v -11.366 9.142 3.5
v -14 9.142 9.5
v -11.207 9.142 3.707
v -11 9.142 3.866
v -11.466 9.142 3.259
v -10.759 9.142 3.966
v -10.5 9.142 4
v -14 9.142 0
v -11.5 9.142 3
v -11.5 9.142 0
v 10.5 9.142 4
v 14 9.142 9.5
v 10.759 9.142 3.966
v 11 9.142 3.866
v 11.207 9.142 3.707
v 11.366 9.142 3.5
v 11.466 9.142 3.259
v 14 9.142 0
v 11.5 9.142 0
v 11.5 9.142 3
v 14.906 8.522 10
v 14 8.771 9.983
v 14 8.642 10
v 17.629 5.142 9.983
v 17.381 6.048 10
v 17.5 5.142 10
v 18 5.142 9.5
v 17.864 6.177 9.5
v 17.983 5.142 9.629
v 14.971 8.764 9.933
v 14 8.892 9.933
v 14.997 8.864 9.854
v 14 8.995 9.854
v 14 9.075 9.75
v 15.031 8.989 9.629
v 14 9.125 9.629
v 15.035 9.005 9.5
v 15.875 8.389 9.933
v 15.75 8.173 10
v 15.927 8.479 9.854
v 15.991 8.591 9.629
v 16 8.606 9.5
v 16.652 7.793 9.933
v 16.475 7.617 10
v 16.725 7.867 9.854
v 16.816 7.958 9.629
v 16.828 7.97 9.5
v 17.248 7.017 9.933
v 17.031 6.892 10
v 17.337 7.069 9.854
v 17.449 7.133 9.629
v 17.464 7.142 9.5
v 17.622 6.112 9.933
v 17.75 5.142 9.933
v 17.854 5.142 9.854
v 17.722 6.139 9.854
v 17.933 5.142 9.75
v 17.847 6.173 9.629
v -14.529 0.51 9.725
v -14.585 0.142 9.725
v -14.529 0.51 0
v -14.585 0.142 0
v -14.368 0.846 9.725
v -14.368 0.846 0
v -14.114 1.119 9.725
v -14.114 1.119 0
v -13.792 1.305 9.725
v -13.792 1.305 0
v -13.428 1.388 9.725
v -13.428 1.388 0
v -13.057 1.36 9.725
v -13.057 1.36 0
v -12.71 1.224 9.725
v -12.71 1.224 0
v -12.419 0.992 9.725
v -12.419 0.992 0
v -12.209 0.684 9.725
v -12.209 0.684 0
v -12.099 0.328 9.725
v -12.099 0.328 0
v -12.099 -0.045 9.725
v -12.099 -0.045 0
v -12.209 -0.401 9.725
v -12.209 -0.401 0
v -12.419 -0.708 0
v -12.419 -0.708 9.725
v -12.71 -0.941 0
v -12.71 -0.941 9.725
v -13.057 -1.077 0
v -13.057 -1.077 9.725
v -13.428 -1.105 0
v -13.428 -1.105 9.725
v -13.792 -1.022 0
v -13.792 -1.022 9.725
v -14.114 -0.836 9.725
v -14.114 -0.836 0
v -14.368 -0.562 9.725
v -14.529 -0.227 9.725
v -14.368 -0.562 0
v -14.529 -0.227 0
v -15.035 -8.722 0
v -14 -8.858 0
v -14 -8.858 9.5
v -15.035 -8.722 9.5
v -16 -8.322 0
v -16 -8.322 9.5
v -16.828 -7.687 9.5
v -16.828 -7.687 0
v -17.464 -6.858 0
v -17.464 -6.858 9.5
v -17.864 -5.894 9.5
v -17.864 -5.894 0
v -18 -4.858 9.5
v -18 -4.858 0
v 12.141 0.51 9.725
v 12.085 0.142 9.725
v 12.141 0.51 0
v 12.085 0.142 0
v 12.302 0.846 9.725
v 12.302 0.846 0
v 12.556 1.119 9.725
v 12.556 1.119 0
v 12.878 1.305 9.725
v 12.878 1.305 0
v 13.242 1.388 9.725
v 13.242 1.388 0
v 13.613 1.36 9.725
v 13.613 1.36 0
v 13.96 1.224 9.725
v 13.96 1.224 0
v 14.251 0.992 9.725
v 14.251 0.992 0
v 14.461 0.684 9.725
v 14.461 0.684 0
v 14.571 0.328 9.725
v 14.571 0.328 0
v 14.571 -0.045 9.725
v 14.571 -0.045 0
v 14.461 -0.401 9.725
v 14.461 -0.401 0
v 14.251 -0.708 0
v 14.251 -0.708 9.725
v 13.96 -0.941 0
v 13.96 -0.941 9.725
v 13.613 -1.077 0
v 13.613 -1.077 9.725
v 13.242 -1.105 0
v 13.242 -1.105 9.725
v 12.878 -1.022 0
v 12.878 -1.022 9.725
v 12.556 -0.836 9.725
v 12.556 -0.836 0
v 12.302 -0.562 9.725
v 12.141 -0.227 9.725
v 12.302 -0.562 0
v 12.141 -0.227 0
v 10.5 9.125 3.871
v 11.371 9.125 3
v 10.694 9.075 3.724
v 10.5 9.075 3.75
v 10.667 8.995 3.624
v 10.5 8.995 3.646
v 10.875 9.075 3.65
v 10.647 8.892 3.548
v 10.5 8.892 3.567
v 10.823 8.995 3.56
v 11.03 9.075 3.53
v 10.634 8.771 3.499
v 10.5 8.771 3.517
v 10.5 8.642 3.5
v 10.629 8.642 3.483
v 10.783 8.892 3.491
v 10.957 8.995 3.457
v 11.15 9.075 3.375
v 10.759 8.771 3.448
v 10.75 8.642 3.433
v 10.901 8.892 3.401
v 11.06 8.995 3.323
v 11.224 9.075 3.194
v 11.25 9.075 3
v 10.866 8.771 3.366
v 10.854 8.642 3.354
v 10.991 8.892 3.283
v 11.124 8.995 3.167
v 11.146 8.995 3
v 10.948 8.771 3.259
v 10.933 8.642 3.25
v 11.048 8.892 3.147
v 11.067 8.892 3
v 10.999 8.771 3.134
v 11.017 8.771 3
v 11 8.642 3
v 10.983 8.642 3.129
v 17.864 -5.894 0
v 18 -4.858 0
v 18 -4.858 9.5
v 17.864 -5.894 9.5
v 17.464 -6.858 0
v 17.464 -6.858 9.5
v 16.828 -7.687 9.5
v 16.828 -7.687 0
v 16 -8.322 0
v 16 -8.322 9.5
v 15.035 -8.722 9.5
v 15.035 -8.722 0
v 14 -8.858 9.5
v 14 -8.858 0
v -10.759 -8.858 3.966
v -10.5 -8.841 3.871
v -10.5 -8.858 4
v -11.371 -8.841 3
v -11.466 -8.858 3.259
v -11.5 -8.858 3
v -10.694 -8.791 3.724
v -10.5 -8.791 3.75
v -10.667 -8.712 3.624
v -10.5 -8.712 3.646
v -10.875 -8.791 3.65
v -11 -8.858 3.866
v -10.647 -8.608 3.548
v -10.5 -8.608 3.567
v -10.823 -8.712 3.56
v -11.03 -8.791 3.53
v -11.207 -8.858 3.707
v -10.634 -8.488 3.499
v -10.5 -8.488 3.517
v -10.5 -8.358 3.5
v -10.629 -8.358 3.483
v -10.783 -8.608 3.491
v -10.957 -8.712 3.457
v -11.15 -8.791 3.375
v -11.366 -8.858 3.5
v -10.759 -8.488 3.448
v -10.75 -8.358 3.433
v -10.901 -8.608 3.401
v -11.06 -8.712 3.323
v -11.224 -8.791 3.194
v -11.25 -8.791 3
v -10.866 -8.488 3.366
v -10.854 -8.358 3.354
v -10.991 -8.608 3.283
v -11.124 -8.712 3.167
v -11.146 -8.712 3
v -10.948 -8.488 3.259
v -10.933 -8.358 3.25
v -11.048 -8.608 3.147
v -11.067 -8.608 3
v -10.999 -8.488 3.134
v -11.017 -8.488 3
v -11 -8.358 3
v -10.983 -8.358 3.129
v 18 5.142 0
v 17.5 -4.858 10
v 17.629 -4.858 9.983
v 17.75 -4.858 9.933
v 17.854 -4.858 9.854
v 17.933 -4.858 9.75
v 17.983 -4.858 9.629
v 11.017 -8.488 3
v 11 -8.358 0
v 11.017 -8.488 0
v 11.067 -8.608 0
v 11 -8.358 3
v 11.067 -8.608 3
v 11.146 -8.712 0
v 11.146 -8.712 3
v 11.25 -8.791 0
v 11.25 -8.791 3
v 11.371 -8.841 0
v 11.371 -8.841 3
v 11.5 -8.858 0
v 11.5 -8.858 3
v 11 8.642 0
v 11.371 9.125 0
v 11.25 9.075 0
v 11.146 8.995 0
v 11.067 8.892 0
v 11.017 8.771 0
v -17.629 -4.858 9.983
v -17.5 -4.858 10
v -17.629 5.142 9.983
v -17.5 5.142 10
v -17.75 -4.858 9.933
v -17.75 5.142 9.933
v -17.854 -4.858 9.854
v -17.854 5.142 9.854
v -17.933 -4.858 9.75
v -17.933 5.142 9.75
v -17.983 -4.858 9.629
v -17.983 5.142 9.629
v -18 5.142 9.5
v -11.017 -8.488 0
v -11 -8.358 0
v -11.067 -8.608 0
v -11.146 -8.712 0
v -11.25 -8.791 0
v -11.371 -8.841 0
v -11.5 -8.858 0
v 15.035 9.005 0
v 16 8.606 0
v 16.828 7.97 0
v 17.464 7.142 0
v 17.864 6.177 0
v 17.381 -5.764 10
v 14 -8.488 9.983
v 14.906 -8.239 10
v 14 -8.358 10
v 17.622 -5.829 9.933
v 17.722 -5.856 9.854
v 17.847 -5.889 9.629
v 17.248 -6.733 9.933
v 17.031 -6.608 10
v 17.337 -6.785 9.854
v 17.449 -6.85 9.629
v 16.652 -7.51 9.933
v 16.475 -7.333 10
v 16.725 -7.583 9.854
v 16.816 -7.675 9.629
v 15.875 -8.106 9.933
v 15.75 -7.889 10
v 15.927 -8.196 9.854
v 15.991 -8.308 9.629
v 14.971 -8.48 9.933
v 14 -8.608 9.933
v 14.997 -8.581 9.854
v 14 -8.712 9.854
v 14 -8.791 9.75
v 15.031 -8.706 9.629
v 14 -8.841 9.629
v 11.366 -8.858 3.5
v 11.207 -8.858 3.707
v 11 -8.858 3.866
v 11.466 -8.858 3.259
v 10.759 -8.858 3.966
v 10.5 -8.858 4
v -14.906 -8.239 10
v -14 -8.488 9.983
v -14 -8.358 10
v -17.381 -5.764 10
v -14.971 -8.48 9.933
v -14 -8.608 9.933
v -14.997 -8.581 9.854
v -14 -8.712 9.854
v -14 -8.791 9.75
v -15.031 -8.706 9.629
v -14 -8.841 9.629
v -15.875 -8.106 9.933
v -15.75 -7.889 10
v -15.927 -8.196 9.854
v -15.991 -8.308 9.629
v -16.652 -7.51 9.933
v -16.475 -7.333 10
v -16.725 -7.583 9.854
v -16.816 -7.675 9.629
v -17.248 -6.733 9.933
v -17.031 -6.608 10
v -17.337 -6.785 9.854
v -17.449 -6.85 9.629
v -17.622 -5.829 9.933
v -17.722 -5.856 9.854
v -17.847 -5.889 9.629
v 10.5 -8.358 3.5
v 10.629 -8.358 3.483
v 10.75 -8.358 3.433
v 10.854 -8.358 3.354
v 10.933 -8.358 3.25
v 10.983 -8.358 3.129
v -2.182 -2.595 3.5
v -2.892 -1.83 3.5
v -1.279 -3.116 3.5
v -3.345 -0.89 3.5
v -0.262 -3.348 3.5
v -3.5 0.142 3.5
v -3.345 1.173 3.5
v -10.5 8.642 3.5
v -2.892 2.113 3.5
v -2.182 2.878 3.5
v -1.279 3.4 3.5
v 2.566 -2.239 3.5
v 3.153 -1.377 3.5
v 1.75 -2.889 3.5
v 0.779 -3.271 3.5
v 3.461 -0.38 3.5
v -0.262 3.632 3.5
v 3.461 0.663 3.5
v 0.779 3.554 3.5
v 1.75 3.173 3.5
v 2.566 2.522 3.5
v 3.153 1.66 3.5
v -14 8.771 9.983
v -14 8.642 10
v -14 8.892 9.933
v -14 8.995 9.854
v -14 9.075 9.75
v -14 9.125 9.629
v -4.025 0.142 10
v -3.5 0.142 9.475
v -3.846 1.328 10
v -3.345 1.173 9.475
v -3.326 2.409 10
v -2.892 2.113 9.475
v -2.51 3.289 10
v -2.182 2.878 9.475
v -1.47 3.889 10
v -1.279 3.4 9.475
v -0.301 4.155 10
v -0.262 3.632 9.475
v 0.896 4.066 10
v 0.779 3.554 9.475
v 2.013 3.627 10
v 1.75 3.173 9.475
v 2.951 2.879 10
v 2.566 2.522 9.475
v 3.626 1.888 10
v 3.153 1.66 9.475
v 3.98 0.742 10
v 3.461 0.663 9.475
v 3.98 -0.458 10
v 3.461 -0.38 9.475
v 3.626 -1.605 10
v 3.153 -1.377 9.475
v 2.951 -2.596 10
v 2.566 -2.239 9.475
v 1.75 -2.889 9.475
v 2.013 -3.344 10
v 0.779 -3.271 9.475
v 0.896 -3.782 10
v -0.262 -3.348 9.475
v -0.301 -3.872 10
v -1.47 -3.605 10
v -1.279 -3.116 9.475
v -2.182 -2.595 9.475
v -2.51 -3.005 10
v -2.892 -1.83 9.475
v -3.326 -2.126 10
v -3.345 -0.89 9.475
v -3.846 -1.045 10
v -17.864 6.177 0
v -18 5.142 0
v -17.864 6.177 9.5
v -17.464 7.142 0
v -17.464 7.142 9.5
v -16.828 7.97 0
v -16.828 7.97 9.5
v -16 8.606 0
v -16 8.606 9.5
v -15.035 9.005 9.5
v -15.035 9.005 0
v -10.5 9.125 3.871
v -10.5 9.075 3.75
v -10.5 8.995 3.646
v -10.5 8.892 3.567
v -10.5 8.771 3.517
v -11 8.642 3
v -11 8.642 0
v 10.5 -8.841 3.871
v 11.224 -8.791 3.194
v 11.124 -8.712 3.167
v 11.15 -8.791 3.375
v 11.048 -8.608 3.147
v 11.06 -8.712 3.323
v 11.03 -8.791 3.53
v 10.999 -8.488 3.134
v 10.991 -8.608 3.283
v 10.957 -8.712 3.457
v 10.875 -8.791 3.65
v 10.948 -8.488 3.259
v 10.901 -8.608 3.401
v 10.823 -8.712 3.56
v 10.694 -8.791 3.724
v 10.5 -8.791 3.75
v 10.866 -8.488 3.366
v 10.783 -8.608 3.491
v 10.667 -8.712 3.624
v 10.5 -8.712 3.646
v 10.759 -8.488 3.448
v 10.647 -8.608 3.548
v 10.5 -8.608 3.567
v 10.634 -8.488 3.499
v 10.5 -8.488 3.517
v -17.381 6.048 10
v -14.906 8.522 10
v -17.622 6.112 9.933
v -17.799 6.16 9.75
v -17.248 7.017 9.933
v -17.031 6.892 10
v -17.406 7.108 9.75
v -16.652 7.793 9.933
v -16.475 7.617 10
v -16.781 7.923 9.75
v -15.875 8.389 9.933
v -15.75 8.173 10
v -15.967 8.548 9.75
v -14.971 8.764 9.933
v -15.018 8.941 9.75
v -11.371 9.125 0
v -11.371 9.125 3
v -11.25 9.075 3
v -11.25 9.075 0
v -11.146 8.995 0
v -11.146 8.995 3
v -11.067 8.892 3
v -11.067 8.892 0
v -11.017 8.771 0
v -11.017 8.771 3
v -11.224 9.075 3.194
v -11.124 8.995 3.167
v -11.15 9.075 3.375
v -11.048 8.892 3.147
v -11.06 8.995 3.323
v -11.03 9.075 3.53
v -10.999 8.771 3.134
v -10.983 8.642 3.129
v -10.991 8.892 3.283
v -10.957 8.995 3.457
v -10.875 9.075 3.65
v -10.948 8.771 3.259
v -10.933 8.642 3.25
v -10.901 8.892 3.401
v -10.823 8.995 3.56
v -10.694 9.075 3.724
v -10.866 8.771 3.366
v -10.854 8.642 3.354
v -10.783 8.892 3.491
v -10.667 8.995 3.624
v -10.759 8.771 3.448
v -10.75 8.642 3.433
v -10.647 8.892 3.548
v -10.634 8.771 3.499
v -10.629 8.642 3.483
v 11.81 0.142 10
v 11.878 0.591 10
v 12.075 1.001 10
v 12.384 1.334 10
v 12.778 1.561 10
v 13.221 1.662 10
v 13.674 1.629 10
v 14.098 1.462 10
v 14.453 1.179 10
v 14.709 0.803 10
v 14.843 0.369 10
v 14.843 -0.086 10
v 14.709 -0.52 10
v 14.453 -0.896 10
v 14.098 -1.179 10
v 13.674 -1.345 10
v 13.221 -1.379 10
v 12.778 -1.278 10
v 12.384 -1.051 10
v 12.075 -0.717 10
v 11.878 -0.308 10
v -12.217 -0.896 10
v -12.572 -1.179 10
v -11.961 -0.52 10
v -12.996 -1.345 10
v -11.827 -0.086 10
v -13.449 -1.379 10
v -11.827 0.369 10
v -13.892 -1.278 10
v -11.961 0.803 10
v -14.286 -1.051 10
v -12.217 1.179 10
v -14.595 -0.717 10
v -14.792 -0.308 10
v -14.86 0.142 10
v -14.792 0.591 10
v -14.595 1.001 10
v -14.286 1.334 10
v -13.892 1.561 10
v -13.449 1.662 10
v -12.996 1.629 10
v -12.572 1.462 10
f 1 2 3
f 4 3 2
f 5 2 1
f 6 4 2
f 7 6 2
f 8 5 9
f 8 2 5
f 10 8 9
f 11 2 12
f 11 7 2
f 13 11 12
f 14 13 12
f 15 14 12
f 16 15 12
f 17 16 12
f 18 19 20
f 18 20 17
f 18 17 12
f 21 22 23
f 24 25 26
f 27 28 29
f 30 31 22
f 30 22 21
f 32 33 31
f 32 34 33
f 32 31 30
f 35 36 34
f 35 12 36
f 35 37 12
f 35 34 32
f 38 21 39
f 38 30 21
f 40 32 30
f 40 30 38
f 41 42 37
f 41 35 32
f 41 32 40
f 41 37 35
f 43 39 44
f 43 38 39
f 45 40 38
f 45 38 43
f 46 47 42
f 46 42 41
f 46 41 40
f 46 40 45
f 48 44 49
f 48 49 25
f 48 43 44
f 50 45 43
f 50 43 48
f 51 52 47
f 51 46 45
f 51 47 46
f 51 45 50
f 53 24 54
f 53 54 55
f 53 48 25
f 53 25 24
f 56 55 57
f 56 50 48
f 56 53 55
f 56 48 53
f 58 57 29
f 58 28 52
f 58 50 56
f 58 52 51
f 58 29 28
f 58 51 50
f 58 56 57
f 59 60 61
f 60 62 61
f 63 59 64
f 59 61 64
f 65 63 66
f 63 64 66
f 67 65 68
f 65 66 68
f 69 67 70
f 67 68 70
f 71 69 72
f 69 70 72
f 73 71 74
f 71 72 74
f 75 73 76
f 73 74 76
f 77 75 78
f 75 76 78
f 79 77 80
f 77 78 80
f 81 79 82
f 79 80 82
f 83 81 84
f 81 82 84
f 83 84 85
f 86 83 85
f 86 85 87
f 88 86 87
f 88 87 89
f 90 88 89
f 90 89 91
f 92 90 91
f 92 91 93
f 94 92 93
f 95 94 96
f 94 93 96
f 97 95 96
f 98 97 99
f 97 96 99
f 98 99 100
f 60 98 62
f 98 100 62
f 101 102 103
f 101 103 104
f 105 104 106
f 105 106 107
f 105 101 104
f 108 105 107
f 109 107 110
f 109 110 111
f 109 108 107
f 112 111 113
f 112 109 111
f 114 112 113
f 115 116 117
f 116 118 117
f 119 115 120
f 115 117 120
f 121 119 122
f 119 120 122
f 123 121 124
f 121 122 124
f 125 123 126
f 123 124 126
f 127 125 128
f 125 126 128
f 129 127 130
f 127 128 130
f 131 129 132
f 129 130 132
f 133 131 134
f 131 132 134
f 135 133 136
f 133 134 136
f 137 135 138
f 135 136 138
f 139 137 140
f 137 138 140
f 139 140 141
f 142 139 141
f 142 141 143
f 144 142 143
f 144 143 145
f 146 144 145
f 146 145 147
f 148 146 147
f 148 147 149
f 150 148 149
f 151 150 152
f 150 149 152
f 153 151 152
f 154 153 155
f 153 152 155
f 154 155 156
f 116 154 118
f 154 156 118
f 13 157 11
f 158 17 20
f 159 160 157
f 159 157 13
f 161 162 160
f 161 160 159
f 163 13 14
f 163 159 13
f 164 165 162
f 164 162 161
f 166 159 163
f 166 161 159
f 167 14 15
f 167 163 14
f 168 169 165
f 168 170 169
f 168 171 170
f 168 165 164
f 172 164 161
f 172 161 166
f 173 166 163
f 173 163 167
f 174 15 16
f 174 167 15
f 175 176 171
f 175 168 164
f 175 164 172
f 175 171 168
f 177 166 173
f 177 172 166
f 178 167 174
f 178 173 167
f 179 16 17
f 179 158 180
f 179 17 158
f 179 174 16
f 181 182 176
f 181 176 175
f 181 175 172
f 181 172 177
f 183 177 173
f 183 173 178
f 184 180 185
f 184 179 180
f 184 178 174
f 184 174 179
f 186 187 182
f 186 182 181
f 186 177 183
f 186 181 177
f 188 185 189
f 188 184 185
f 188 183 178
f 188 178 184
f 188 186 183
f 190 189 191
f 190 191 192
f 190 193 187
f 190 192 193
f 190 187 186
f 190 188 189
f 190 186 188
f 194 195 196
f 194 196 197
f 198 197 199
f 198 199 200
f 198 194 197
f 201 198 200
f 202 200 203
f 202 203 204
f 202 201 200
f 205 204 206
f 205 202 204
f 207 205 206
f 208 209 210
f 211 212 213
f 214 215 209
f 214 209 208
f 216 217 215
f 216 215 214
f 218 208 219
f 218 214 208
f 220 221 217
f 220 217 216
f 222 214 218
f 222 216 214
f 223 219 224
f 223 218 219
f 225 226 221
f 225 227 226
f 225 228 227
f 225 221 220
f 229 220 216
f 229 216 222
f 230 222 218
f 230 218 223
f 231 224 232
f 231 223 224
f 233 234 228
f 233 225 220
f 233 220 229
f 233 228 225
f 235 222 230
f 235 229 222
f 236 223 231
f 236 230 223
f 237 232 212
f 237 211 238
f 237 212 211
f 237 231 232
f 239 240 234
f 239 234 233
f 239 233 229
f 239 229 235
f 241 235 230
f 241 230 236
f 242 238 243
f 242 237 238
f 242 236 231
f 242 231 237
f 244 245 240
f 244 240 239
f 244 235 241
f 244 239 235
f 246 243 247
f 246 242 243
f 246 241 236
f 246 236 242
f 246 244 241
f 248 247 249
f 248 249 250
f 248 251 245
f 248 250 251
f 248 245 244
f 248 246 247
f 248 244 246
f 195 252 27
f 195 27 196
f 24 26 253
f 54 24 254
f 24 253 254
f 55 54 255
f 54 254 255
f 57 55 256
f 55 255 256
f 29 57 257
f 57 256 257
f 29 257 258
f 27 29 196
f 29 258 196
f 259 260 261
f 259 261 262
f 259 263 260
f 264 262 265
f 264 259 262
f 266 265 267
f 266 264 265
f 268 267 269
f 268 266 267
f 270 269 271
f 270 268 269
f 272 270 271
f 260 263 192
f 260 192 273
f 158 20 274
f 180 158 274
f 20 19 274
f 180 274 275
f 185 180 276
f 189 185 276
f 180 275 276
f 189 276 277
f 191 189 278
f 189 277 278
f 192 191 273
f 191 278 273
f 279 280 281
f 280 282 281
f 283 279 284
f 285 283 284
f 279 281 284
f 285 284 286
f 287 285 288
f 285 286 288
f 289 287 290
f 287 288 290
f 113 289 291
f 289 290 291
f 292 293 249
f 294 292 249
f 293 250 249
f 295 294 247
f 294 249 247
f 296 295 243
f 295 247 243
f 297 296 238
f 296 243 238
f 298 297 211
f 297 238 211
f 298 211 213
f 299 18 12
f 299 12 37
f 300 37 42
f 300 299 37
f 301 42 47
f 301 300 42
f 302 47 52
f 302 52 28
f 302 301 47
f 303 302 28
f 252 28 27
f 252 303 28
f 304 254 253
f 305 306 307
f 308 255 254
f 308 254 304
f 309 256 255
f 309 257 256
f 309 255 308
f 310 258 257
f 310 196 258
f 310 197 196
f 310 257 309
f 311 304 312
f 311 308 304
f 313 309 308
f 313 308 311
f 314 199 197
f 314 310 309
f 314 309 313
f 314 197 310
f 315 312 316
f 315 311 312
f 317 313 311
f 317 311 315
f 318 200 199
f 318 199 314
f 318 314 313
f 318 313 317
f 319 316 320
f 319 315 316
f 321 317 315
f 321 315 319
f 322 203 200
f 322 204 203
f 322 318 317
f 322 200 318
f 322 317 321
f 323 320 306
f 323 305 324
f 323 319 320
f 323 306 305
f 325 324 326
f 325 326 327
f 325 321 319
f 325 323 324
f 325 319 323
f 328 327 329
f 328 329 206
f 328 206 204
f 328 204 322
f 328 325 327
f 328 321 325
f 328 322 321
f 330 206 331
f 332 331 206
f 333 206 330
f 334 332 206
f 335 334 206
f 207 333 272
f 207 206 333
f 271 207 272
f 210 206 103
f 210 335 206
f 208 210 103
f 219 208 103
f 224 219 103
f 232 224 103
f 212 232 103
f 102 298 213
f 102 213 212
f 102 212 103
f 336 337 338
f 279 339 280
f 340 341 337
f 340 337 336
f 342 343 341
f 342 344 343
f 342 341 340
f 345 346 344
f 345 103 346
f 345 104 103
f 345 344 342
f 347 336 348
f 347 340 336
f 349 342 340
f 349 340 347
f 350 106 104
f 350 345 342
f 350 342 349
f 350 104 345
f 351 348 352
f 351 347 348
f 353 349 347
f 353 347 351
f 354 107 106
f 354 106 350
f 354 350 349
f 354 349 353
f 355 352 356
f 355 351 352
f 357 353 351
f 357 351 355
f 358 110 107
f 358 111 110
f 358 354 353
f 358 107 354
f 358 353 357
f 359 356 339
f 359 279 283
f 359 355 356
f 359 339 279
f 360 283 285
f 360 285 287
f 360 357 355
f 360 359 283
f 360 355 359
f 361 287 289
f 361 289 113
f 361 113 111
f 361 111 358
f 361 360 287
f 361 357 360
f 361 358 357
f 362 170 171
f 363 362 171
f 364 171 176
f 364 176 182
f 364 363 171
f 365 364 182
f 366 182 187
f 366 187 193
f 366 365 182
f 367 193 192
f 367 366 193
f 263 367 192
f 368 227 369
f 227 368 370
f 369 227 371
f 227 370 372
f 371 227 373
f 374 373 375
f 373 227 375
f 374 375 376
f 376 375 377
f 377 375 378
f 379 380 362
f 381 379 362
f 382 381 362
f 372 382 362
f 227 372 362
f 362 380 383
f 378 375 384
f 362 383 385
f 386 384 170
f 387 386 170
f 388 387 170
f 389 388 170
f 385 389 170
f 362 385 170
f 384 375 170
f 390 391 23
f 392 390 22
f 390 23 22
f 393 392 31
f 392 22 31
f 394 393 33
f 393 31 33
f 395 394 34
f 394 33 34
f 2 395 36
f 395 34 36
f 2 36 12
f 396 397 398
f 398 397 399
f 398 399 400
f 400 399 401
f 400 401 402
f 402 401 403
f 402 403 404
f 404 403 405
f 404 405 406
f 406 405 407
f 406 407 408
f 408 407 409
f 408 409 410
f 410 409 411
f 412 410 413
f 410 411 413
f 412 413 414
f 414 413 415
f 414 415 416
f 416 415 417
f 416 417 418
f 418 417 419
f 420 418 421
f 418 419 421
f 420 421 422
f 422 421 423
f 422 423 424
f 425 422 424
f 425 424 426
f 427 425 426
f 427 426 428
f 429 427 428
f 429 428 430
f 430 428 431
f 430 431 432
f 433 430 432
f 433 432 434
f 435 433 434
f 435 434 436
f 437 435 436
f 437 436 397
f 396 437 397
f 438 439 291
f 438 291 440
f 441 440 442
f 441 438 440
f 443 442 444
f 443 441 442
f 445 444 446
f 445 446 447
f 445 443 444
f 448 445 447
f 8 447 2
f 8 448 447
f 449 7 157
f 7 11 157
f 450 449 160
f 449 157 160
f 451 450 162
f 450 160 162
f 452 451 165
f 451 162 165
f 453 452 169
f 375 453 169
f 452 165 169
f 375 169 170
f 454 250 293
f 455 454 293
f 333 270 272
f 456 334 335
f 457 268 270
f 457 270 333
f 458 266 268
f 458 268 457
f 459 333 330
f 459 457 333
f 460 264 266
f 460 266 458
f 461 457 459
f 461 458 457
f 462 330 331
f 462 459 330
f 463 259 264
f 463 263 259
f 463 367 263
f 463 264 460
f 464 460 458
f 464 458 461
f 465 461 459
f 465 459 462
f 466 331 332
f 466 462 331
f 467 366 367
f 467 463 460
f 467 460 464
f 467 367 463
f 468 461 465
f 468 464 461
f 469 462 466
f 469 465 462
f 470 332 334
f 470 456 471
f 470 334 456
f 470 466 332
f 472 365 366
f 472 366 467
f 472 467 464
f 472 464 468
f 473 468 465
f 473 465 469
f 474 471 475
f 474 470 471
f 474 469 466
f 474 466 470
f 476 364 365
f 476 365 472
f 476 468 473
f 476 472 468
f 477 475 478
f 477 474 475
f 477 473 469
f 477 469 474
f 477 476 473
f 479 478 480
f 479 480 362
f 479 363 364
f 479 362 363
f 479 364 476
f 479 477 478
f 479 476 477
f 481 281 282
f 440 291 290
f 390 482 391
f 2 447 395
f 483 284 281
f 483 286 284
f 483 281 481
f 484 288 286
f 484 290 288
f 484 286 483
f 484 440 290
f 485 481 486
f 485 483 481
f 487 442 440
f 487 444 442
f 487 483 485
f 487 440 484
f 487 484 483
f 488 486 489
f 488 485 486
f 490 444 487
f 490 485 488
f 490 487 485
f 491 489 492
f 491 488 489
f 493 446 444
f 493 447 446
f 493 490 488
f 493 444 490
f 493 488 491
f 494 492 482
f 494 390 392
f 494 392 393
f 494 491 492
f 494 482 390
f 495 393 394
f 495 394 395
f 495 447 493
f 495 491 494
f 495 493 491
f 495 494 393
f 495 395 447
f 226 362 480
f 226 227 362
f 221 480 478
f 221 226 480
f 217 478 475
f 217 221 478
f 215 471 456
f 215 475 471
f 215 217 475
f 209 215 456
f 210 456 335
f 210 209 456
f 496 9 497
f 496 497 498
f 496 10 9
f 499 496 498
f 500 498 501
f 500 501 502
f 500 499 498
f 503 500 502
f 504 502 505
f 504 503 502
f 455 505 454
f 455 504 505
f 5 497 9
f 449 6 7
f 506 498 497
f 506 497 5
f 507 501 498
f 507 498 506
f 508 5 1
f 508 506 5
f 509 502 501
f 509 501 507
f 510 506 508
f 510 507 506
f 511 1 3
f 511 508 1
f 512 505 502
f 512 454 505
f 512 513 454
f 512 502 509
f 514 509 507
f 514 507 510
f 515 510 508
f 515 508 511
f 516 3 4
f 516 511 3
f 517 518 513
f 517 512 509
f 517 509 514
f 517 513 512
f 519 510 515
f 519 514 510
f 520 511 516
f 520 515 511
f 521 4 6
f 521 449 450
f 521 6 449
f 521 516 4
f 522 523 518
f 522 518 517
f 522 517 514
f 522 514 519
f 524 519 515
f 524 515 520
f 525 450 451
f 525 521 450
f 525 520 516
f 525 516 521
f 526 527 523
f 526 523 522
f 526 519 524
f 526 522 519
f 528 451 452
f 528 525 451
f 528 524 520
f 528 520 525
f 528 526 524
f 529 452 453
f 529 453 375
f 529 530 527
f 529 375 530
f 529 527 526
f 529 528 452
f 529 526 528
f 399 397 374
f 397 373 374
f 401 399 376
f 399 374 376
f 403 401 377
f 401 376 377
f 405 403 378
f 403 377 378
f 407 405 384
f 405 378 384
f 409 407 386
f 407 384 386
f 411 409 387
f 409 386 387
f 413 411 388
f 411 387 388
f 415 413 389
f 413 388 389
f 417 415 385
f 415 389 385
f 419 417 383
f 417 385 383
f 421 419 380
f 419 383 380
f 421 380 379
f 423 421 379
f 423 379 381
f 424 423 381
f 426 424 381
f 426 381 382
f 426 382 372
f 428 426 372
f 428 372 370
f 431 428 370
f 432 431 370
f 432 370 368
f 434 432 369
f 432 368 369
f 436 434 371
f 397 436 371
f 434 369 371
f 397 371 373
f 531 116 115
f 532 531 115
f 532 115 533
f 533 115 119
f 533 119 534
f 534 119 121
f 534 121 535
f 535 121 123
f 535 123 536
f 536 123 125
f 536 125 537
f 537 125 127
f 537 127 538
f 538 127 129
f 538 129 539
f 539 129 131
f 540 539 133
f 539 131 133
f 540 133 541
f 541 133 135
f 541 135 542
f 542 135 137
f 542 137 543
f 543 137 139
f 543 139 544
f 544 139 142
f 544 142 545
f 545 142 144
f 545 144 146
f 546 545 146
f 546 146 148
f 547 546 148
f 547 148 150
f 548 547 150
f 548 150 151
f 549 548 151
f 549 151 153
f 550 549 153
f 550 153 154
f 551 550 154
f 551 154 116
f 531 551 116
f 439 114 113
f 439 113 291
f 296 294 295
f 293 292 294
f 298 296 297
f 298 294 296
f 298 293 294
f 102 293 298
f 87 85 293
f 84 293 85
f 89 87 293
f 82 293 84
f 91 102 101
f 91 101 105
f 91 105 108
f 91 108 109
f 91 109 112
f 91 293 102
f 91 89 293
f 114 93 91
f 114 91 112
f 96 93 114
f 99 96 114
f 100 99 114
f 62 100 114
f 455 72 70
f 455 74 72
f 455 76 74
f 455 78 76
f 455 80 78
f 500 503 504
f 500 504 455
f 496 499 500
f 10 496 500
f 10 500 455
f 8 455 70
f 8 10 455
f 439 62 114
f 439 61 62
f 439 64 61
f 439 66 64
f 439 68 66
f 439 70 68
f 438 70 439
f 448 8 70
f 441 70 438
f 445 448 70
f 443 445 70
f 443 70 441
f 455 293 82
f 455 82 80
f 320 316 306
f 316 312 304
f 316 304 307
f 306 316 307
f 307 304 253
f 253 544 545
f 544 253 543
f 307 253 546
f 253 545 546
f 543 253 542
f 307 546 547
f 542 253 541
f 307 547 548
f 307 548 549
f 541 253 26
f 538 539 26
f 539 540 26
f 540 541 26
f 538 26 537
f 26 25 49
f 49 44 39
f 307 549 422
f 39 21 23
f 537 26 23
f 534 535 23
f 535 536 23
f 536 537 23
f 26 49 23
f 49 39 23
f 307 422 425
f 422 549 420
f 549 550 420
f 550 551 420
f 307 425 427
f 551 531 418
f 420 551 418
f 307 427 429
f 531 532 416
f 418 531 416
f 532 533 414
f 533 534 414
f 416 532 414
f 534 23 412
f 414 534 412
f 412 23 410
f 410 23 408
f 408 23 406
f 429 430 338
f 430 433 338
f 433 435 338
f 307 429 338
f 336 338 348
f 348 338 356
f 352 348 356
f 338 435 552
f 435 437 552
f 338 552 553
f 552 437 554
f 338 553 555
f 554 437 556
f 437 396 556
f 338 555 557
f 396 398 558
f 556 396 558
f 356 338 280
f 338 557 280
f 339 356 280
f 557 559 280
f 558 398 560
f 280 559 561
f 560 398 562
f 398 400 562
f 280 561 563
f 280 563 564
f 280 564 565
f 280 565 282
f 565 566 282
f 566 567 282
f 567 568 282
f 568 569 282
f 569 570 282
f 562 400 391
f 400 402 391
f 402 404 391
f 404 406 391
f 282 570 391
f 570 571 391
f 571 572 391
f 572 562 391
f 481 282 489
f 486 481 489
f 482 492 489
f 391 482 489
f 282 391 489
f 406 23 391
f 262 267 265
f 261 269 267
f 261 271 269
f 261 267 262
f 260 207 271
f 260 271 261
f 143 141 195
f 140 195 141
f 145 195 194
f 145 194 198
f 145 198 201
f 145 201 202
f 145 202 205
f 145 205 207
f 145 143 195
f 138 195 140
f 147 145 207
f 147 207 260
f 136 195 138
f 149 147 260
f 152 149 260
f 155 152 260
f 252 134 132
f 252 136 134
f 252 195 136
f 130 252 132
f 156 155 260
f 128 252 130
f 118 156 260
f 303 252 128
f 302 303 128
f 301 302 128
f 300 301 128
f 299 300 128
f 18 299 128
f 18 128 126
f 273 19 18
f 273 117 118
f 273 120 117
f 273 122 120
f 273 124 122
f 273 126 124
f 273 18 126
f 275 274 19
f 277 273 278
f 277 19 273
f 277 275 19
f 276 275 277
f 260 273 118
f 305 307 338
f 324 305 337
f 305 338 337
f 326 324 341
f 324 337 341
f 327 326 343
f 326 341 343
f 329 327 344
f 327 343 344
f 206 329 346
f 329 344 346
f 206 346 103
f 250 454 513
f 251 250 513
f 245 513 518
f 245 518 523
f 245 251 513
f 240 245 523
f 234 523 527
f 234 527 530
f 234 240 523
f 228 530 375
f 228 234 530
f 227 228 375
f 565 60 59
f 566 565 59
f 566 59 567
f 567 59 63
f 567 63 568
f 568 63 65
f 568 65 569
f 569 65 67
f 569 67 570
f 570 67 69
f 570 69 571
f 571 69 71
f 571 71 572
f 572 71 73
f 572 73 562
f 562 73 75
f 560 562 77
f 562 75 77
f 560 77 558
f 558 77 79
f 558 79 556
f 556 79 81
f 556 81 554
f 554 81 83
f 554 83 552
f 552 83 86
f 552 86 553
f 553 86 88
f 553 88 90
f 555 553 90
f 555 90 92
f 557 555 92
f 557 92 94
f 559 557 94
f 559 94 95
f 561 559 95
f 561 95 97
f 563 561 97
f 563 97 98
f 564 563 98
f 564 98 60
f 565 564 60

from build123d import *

# Parameters (mm, degrees)
BOSS_EXTRUDE1_DEPTH             = 10
SKETCH5_W                       = 22
SKETCH5_H                       = 7
CUT_EXTRUDE2_DEPTH              = 28.349588662
FILLET3_R                       = 0.5
M3X0_5_TAPPED_HOLE1_D           = 2.5
M3X0_5_TAPPED_HOLE1_CSINK_D     = 3.05
M3X0_5_TAPPED_HOLE1_CSINK_ANGLE = 90
M8X1_0_TAPPED_HOLE1_D           = 7
M8X1_0_TAPPED_HOLE1_CSINK_D     = 8.05
M8X1_0_TAPPED_HOLE1_CSINK_ANGLE = 90


with BuildPart() as part:
    # Sketch1 → Boss-Extrude1 (new body)
    with BuildSketch(Plane.XY):
        with BuildLine():
            Line((-14, 9.141740125), (14, 9.141740125))
            ThreePointArc((14, 9.141740125), (16.828427125, 7.97016725), (18, 5.141740125))
            Line((18, 5.141740125), (18, -4.858259875))
            ThreePointArc((18, -4.858259875), (16.828427125, -7.686686999), (14, -8.858259875))
            Line((14, -8.858259875), (-14, -8.858259875))
            ThreePointArc((-14, -8.858259875), (-16.828427125, -7.686686999), (-18, -4.858259875))
            Line((-18, -4.858259875), (-18, 5.141740125))
            ThreePointArc((-18, 5.141740125), (-16.828427125, 7.97016725), (-14, 9.141740125))
        make_face()
    extrude(amount=BOSS_EXTRUDE1_DEPTH)

    # Sketch5 → Cut-Extrude2 (cut, through all)
    with BuildSketch(Plane(origin=(0, 9.141740125, 0), x_dir=(1, 0, 0), z_dir=(0, 1, 0))):
        Rectangle(SKETCH5_W, SKETCH5_H)
    extrude(amount=-CUT_EXTRUDE2_DEPTH, mode=Mode.SUBTRACT)

    # Fillet3
    fillet3_edges = [part.edges().sort_by_distance(p)[0] for p in [
        (-16.828427125, 7.97016725, 10),
        (-18, 0.141740125, 10),
        (-16.828427125, -7.686686999, 10),
        (0, -8.858259875, 10),
        (16.828427125, -7.686686999, 10),
        (11, -8.858259875, 1.75),
        (18, 0.141740125, 10),
        (0, -8.858259875, 3.5),
        (11, 0.141740125, 3.5),
        (-11, -8.858259875, 1.75),
        (-11, 0.141740125, 3.5),
        (-11, 9.141740125, 1.75),
        (0, 9.141740125, 3.5),
        (11, 9.141740125, 1.75),
        (16.828427125, 7.97016725, 10),
        (0, 9.141740125, 10),
    ]]
    fillet(fillet3_edges, radius=FILLET3_R)

    # M3x0.5 Tapped Hole1 (through all)
    with Locations(Plane(origin=(-13.335, 0.141740125, 10), x_dir=(1, 0, 0), z_dir=(0, 0, 1))):
        with Locations((0, 0), (26.67, 0)):
            CounterSinkHole(M3X0_5_TAPPED_HOLE1_D / 2, M3X0_5_TAPPED_HOLE1_CSINK_D / 2, counter_sink_angle=M3X0_5_TAPPED_HOLE1_CSINK_ANGLE)

    # M8x1.0 Tapped Hole1 (through all)
    with Locations(Plane(origin=(0, 0.141740125, 10), x_dir=(1, 0, 0), z_dir=(0, 0, 1))):
        with Locations((0, 0)):
            CounterSinkHole(M8X1_0_TAPPED_HOLE1_D / 2, M8X1_0_TAPPED_HOLE1_CSINK_D / 2, counter_sink_angle=M8X1_0_TAPPED_HOLE1_CSINK_ANGLE)


solid = part.part
